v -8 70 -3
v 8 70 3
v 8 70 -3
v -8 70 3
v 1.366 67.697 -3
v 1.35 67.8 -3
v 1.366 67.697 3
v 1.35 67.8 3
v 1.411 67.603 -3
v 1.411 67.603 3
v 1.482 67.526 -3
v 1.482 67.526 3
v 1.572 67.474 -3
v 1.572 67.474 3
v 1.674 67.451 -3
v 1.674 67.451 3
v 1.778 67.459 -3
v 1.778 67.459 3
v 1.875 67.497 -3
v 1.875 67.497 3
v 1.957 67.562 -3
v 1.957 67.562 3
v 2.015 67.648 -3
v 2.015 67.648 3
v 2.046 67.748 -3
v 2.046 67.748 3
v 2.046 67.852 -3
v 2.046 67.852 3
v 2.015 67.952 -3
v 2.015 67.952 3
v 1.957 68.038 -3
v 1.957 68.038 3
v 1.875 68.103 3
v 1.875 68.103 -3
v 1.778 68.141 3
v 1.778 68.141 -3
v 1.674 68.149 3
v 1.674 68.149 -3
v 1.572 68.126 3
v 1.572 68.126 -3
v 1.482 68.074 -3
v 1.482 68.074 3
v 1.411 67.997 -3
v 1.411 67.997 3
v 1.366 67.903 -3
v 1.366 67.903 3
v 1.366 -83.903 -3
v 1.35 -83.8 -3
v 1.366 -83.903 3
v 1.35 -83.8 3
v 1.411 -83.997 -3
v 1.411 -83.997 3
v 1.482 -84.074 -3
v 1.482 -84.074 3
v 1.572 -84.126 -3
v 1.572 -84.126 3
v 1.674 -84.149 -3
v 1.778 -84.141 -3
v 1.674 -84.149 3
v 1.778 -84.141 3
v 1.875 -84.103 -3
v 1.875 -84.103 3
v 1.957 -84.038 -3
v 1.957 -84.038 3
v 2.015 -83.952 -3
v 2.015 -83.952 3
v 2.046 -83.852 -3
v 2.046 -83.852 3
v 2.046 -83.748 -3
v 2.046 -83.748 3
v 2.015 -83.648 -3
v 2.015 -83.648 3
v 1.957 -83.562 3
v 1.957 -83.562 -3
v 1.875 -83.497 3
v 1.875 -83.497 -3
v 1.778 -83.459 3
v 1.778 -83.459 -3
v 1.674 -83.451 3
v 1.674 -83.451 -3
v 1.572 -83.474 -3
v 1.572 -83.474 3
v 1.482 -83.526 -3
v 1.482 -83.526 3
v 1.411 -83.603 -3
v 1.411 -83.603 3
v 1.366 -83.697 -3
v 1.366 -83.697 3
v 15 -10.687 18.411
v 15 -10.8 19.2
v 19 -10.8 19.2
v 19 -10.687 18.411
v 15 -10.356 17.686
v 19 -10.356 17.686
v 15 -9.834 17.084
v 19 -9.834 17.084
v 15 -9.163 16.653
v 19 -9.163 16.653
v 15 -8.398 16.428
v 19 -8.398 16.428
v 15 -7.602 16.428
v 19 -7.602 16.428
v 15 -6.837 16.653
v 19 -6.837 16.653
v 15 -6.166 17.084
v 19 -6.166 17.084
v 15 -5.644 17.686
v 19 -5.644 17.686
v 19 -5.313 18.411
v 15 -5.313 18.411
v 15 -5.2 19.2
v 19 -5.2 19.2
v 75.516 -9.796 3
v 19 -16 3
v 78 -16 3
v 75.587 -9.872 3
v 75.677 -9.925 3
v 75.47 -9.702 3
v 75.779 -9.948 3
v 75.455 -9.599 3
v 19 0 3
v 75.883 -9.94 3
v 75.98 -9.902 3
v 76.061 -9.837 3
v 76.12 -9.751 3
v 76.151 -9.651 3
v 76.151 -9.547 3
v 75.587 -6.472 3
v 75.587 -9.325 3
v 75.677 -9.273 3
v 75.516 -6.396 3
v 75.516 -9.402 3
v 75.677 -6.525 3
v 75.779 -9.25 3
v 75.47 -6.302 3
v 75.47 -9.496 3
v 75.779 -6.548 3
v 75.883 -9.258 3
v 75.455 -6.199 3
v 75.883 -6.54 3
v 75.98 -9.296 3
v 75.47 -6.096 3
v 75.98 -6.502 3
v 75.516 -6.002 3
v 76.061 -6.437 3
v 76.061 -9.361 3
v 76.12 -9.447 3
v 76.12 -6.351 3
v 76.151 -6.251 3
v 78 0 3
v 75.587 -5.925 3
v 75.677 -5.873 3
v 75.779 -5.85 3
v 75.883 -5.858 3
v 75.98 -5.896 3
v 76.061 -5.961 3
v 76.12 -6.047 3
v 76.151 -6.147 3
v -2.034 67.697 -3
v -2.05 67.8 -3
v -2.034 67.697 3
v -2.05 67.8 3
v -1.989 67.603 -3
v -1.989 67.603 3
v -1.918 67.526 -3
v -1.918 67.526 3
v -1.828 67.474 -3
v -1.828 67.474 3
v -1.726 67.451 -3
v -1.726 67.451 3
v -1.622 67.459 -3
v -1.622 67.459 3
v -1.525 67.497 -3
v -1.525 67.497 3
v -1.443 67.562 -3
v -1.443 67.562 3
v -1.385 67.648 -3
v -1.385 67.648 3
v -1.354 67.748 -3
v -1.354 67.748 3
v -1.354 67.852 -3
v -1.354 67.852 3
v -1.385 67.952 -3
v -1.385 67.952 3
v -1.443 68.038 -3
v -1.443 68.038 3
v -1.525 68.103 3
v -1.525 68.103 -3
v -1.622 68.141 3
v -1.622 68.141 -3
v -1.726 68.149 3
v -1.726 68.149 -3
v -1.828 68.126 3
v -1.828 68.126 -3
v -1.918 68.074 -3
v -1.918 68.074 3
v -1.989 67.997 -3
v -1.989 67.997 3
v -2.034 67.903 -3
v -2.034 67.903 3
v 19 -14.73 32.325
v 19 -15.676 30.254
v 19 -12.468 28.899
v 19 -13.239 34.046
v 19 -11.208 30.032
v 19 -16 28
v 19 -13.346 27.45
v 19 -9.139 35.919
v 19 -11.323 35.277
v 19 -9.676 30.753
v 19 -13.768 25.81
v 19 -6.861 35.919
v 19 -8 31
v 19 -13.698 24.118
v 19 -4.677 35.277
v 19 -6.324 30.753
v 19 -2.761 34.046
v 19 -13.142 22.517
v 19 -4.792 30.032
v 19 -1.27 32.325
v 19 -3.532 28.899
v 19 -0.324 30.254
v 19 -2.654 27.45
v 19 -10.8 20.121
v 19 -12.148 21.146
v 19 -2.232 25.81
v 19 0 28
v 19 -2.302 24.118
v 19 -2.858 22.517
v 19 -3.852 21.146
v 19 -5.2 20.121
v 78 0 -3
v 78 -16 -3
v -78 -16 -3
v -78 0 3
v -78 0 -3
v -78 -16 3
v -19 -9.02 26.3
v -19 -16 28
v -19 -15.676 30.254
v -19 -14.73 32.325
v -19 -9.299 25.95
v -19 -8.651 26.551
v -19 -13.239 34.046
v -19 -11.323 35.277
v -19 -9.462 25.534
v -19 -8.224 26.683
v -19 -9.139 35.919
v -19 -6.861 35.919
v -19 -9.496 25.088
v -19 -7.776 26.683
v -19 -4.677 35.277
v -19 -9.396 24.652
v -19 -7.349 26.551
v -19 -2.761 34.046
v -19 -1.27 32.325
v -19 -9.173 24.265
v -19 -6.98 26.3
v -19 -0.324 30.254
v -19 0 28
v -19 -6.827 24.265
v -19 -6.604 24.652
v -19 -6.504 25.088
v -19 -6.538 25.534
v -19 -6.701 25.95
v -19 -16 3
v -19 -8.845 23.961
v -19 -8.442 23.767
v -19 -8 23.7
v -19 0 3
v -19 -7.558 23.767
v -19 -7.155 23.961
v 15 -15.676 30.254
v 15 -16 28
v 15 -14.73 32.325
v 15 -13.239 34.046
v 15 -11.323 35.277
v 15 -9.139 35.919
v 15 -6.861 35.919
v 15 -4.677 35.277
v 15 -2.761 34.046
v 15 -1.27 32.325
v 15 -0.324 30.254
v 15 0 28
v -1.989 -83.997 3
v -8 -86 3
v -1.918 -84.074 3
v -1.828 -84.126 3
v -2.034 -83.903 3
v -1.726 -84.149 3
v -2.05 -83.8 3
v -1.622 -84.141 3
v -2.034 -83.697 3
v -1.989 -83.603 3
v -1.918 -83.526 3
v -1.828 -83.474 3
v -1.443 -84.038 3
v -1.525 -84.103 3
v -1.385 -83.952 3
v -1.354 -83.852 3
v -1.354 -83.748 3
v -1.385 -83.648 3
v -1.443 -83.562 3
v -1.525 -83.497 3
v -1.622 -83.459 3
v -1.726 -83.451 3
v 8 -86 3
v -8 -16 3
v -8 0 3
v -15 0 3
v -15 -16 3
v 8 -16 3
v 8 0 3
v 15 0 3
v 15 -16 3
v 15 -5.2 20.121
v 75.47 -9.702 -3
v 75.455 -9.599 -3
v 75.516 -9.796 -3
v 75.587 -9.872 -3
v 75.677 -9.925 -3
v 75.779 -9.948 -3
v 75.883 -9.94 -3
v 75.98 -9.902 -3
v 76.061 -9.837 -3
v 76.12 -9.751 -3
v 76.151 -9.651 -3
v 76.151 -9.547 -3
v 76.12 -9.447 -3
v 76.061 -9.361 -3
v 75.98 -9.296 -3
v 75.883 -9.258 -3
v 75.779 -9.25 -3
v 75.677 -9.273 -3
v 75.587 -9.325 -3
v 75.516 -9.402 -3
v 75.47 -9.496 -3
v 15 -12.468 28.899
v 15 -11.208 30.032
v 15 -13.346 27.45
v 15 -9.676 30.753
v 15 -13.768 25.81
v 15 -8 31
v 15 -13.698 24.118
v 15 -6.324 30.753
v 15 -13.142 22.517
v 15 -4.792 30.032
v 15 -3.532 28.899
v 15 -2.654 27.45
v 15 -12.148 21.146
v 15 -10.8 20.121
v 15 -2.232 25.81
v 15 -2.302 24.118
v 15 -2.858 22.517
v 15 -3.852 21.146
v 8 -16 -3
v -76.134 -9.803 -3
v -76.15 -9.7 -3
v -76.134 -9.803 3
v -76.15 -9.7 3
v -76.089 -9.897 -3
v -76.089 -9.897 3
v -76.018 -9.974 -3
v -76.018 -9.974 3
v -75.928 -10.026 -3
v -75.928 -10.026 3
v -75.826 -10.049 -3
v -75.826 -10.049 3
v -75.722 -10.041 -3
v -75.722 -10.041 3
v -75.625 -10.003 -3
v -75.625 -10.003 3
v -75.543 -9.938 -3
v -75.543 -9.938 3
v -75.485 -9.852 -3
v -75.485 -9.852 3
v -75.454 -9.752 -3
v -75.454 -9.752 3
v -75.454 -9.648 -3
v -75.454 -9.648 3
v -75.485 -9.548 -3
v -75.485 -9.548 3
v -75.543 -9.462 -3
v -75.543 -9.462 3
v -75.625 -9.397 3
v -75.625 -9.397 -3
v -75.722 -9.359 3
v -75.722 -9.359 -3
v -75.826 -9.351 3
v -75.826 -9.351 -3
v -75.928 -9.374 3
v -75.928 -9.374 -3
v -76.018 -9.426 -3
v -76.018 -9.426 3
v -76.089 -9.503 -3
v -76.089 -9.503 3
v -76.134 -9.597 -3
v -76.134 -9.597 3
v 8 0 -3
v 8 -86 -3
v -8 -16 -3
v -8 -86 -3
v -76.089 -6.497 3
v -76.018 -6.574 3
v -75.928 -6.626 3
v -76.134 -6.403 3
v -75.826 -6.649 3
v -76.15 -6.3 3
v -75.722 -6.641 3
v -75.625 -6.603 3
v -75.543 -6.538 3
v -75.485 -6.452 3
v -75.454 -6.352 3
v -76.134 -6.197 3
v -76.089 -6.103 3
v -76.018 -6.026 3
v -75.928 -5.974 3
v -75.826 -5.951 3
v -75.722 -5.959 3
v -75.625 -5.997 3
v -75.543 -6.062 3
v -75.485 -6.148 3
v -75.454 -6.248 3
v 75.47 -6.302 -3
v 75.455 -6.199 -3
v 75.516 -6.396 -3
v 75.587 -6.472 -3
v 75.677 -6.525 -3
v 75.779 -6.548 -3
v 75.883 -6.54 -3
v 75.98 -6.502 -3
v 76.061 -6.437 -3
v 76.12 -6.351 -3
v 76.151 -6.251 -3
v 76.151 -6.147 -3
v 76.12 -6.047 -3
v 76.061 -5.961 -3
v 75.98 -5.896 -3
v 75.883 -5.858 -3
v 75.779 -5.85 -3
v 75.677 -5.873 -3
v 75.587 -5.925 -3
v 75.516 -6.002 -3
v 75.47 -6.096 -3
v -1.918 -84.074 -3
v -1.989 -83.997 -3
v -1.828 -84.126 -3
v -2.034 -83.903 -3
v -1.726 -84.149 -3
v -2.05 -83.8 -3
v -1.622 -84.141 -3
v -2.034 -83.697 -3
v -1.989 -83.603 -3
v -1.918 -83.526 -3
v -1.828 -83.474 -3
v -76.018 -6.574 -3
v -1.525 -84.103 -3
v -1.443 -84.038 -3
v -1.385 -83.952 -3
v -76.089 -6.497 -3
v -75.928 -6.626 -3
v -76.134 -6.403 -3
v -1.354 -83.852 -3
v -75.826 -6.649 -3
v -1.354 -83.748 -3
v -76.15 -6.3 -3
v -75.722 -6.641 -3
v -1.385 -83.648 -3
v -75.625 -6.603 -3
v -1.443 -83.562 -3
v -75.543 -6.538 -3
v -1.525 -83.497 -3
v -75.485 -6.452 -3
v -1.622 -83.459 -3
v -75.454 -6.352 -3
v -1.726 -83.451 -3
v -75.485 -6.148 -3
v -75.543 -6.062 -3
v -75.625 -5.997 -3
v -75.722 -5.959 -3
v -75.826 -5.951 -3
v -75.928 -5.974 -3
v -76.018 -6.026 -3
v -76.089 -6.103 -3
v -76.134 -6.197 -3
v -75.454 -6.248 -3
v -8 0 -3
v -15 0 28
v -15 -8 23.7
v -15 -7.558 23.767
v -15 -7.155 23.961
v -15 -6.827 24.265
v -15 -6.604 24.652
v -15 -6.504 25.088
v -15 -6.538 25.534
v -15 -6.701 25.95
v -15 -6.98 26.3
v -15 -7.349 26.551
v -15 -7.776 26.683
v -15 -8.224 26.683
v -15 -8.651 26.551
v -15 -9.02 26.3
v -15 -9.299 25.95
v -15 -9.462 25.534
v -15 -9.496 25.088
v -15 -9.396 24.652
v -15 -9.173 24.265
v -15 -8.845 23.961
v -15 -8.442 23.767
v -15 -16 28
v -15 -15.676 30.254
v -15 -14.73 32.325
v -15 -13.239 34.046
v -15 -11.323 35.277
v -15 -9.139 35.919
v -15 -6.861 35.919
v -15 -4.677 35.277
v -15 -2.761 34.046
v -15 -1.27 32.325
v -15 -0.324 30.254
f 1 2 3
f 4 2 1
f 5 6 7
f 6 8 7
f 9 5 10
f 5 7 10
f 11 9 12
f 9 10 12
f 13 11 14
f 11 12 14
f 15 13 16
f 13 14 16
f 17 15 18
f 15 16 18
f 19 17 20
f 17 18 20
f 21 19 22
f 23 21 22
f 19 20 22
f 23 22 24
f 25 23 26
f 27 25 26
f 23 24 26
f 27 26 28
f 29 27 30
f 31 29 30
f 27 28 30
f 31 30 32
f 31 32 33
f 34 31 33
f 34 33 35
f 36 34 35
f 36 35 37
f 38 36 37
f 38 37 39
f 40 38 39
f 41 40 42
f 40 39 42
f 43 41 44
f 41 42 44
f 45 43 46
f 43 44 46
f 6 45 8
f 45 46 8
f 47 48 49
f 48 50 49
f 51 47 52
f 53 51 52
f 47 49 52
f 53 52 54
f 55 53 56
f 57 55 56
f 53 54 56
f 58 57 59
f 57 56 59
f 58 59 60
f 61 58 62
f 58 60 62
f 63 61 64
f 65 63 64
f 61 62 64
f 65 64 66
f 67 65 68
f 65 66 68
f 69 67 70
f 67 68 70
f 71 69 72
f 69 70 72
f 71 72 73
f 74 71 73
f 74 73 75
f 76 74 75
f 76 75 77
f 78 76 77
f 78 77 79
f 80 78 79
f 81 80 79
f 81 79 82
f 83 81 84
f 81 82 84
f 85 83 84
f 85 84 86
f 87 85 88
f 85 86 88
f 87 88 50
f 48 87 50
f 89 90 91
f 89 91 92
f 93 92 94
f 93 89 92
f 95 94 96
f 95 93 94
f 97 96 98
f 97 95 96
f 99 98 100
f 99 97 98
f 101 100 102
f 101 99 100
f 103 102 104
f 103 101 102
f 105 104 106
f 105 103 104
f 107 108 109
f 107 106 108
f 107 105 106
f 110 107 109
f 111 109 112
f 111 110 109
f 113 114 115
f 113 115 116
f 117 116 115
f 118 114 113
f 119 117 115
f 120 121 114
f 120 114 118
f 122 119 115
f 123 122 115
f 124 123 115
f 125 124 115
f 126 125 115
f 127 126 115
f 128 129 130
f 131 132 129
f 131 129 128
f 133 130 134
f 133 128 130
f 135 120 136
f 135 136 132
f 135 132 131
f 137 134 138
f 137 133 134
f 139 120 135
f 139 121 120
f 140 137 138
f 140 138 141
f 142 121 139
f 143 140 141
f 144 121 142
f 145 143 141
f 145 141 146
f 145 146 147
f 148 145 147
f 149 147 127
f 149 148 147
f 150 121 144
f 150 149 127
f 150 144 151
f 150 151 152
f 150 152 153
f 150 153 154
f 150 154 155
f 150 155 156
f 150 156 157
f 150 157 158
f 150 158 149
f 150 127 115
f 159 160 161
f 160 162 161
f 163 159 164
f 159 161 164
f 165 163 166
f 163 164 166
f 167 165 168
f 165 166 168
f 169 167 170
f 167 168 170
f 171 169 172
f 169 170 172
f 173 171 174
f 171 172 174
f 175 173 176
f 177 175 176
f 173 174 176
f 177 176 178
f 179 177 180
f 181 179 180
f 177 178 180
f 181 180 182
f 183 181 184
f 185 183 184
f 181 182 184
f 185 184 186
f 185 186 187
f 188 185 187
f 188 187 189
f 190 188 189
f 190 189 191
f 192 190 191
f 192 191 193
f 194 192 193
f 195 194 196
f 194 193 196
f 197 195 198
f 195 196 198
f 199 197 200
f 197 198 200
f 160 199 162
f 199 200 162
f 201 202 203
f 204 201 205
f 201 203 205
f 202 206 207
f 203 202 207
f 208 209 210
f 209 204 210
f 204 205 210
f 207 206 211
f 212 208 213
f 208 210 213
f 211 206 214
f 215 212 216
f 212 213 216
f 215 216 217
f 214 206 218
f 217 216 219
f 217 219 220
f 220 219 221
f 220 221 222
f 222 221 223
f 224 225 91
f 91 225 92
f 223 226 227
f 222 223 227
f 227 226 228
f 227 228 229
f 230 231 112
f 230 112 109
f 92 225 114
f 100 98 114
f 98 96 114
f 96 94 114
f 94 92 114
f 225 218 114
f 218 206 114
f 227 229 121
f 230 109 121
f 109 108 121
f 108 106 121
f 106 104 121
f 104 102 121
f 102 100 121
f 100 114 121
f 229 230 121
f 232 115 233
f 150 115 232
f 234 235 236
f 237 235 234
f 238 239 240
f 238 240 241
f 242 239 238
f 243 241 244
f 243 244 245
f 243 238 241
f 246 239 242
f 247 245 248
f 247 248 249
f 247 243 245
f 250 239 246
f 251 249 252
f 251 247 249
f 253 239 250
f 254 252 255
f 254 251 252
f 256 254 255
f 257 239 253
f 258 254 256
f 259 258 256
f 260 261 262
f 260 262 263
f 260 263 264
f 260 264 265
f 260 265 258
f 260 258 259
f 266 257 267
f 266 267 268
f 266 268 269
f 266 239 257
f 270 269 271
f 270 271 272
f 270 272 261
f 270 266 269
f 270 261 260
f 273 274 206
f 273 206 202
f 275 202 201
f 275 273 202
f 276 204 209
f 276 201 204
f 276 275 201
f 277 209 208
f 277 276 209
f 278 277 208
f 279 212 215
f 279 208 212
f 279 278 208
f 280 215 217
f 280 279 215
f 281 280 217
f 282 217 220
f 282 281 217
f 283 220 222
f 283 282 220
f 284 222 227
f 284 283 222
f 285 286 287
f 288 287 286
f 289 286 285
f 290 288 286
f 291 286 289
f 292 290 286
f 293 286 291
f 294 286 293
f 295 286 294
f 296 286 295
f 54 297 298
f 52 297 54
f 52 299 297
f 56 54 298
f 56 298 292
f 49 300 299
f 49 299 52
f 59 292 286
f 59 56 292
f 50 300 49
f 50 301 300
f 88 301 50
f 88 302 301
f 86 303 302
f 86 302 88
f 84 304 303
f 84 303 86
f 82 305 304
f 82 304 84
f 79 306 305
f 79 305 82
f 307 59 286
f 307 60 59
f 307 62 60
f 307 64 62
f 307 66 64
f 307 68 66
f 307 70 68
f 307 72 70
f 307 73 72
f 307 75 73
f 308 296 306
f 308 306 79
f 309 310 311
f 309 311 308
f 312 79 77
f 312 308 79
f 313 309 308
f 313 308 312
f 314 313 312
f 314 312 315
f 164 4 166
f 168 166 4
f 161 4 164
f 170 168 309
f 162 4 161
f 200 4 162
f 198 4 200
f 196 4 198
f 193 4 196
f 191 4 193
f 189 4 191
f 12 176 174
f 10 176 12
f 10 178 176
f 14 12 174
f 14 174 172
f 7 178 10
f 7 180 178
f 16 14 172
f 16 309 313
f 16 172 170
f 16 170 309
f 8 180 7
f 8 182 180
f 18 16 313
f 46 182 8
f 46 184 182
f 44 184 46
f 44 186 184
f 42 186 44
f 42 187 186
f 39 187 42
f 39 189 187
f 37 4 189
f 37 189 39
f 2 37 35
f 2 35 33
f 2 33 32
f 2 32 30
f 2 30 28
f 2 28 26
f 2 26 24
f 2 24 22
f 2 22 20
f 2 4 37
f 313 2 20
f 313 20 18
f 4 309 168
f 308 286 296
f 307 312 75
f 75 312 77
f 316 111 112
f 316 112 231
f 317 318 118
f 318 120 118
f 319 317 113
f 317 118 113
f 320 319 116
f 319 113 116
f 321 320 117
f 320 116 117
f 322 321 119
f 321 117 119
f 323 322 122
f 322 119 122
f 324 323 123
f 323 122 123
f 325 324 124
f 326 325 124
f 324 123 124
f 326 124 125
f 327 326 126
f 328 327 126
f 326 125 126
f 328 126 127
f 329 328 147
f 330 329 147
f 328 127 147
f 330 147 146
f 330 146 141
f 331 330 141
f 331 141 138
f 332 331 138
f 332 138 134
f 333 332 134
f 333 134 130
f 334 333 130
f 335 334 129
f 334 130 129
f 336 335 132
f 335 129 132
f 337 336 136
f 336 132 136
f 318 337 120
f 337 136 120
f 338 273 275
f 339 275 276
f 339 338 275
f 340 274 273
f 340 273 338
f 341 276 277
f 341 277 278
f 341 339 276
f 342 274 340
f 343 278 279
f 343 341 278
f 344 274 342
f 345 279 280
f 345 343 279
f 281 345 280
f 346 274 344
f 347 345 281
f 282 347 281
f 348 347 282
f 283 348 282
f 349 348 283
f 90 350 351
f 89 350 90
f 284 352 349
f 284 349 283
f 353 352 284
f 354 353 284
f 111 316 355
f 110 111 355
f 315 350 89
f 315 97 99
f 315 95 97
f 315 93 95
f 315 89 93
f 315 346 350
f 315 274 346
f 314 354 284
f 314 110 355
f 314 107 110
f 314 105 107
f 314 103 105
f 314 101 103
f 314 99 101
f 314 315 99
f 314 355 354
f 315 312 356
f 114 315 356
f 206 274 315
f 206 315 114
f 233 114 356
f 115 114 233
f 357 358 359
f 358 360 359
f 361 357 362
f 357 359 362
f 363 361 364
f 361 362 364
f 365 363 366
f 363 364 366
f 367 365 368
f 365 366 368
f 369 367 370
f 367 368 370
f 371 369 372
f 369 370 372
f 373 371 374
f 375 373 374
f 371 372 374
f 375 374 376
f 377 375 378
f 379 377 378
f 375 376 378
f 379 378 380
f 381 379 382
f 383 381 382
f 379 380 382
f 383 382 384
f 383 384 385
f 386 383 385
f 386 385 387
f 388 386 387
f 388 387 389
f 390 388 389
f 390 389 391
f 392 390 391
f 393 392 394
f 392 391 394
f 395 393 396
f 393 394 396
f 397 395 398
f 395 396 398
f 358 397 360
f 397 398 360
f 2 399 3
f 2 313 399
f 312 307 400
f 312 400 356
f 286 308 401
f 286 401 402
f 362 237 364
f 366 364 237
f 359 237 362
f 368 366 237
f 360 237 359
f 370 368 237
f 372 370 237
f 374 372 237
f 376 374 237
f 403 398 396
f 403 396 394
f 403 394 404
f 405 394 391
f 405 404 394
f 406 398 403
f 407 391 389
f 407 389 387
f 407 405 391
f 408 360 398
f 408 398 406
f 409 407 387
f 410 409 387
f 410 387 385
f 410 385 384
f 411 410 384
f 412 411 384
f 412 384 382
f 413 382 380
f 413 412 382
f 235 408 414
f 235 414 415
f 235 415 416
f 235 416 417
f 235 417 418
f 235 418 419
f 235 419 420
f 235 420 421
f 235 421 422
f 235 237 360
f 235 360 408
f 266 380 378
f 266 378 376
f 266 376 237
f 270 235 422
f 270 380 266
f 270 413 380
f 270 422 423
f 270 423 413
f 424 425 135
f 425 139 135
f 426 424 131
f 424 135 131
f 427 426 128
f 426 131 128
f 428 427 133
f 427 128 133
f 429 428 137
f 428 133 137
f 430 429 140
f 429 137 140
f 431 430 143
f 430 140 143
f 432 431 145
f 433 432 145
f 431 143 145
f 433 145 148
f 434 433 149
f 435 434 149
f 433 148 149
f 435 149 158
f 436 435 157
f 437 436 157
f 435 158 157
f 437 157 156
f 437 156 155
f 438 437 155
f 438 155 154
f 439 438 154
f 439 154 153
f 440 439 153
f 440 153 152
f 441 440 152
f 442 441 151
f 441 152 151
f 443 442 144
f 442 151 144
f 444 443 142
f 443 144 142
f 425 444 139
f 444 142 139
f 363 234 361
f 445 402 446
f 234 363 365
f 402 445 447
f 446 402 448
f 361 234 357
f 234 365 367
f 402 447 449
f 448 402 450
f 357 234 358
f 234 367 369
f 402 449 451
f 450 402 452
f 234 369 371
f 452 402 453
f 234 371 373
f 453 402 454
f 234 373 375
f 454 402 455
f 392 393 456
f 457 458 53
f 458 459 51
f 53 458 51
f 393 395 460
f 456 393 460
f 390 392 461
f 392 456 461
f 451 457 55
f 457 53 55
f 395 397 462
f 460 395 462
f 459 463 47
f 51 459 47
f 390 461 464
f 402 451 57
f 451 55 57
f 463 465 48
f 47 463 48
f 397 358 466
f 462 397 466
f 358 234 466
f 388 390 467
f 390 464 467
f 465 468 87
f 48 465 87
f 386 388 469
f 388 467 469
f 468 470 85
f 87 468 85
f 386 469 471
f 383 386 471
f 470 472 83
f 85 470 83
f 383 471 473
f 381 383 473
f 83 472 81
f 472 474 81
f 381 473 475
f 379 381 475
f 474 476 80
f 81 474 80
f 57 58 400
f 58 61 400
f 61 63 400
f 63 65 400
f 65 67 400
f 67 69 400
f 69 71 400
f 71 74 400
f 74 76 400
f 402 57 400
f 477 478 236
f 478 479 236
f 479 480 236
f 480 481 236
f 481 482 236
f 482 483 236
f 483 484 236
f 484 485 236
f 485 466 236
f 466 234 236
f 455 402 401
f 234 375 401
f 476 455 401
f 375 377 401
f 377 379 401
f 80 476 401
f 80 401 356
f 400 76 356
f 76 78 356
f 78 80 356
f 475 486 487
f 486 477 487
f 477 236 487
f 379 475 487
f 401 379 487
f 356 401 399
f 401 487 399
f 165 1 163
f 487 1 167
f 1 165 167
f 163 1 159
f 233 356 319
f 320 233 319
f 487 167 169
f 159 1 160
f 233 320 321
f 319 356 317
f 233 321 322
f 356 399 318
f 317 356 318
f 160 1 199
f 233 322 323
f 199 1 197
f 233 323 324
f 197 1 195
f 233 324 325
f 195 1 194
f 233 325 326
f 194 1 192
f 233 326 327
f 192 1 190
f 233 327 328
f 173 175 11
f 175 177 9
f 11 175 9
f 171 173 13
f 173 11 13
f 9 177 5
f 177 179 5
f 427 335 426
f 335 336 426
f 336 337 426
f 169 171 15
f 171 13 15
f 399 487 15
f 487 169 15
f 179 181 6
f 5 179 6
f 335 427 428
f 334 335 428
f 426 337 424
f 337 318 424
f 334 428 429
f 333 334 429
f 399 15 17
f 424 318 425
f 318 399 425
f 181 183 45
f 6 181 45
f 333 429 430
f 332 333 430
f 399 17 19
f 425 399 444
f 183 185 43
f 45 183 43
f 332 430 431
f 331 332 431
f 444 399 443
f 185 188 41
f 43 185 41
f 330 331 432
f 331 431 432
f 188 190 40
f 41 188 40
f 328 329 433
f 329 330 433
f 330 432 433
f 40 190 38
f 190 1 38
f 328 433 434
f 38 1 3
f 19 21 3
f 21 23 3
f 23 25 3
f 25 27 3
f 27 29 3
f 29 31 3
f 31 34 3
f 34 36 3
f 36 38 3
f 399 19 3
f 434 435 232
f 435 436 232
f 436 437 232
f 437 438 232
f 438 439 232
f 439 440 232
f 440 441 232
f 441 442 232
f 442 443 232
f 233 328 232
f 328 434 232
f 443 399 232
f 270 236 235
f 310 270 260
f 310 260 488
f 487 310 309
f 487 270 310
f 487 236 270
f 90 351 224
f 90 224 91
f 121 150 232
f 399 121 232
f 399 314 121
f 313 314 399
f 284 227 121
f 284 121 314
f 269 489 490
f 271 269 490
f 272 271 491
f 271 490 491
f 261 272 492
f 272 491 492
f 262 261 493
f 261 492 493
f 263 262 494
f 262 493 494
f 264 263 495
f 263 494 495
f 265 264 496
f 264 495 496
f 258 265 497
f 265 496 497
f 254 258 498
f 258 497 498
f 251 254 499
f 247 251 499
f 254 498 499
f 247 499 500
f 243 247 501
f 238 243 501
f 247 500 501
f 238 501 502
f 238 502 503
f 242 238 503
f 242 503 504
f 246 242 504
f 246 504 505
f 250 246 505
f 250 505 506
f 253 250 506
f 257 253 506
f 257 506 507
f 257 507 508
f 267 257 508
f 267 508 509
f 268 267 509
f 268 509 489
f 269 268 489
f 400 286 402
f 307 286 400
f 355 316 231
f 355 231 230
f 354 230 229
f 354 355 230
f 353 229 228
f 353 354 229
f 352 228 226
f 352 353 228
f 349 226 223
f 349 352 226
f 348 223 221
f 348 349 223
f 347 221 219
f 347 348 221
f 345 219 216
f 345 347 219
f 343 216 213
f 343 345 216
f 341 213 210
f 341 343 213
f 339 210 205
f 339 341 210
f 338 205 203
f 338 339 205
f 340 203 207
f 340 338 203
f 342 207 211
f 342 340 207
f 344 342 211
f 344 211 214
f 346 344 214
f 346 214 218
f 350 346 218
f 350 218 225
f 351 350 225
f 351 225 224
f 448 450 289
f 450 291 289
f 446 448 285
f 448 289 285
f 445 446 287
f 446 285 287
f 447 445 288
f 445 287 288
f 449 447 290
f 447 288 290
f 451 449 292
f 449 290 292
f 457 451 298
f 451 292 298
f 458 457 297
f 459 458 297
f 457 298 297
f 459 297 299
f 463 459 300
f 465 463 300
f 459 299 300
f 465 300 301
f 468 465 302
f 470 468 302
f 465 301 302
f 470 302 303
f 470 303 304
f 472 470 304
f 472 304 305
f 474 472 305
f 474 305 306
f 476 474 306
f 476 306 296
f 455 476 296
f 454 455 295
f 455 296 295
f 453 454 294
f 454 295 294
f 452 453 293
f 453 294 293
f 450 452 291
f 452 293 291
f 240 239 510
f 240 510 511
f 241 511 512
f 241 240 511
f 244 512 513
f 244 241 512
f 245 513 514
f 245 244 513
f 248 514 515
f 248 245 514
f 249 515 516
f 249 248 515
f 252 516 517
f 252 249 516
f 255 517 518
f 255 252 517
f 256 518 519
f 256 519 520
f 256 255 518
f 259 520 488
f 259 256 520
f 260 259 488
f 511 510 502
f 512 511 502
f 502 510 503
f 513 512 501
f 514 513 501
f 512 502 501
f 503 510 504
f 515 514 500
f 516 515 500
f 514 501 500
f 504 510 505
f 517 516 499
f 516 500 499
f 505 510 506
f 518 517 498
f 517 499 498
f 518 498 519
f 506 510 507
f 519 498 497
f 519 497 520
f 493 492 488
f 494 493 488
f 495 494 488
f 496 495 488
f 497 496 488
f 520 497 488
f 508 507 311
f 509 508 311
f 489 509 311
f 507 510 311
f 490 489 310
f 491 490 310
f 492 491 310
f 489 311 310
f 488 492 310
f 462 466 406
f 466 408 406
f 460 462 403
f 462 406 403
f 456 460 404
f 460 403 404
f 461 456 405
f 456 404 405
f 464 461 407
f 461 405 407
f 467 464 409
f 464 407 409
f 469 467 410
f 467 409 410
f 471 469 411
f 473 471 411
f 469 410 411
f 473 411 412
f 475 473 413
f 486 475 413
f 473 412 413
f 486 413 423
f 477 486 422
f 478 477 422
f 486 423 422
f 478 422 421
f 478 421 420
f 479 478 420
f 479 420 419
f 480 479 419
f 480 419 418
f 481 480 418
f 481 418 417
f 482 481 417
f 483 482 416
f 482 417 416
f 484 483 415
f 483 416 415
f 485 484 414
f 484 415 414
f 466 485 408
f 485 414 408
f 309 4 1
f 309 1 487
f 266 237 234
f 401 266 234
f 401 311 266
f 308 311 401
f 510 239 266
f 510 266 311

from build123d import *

# Parameters (mm, degrees)
Y_KSEKLIK_EKSTR_ZYON1_DEPTH = 3
IZIM2_R                     = 0.35
KES_EKSTR_ZYON1_DEPTH       = 5
IZIM3_W                     = 4
IZIM3_H                     = 16
Y_KSEKLIK_EKSTR_ZYON4_DEPTH = 36
KES_EKSTR_ZYON2_DEPTH       = 122.556571192
KES_EKSTR_ZYON2_DEPTH_BACK  = 122.556571192
KES_EKSTR_ZYON3_DEPTH       = 100
IZIM8_R                     = 1.5
KES_EKSTR_ZYON4_DEPTH       = 30


with BuildPart() as part:
    # Çizim1 → Yükseklik-Ekstrüzyon1 (new, symmetric)
    with BuildSketch(Plane.XY):
        Polygon((8, 70), (-8, 70), (-8, 0), (-78, 0), (-78, -16), (-8, -16), (-8, -86), (8, -86), (8, -16), (78, -16), (78, 0), (8, 0), align=None)
    extrude(amount=Y_KSEKLIK_EKSTR_ZYON1_DEPTH, both=True)

    # Çizim2 → Kes-Ekstrüzyon1 (cut, symmetric)
    with BuildSketch(Plane.XY):
        with Locations(Location((-75.8, -6.3, 0), (0, 0, 180))):
            Circle(IZIM2_R)
        with Locations(Location((-75.8, -9.7, 0), (0, 0, 180))):
            Circle(IZIM2_R)
        with Locations(Location((-1.7, 67.8, 0), (0, 0, 180))):
            Circle(IZIM2_R)
        with Locations(Location((1.7, 67.8, 0), (0, 0, 180))):
            Circle(IZIM2_R)
        with Locations(Location((75.804898835, -6.19877905, 0), (0, 0, 180))):
            Circle(IZIM2_R)
        with Locations(Location((75.804898835, -9.59877905, 0), (0, 0, 180))):
            Circle(IZIM2_R)
        with Locations((-75.804898835, 141.79877905)):
            Circle(IZIM2_R)
        with Locations((-75.804898835, 145.19877905)):
            Circle(IZIM2_R)
        with Locations((73.99877905, 143.604898835)):
            Circle(IZIM2_R)
        with Locations((77.39877905, 143.604898835)):
            Circle(IZIM2_R)
        with Locations(Location((-1.7, -83.8, 0), (0, 0, 180))):
            Circle(IZIM2_R)
        with Locations(Location((1.7, -83.8, 0), (0, 0, 180))):
            Circle(IZIM2_R)
    extrude(amount=KES_EKSTR_ZYON1_DEPTH, both=True, mode=Mode.SUBTRACT)

    # Çizim3 → Yükseklik-Ekstrüzyon4 (add)
    with BuildSketch(Plane.XY):
        with Locations((-17, -8)):
            Rectangle(IZIM3_W, IZIM3_H)
        with Locations((17, -8)):
            Rectangle(IZIM3_W, IZIM3_H)
    extrude(amount=Y_KSEKLIK_EKSTR_ZYON4_DEPTH)

    # Çizim6 → Kes-Ekstrüzyon2 (cut, two sides: drawn at the far end of the back side and taken through both)
    with BuildSketch(Plane(origin=(0, 0, 0), x_dir=(0, 0, -1), z_dir=(1, 0, 0)).offset(-KES_EKSTR_ZYON2_DEPTH_BACK)):
        with BuildLine():
            Line((-36, 0), (-39.977521608, 0))
            Line((-39.977521608, 0), (-39.977521608, -16))
            Line((-39.977521608, -16), (-36, -16))
            Line((-36, -16), (-28, -16))
            ThreePointArc((-28, -16), (-36, -8), (-28, 0))
            Line((-28, 0), (-36, 0))
        make_face()
    extrude(amount=KES_EKSTR_ZYON2_DEPTH + KES_EKSTR_ZYON2_DEPTH_BACK, mode=Mode.SUBTRACT)

    # Çizim7 → Kes-Ekstrüzyon3 (cut)
    with BuildSketch(Plane(origin=(0, 0, 0), x_dir=(0, 0, -1), z_dir=(1, 0, 0))):
        with BuildLine():
            Line((-19.2, -5.2), (-20.12062996, -5.2))
            ThreePointArc((-20.12062996, -5.2), (-31, -8), (-20.12062996, -10.8))
            Line((-20.12062996, -10.8), (-19.2, -10.8))
            ThreePointArc((-19.2, -10.8), (-16.4, -8), (-19.2, -5.2))
        make_face()
    extrude(amount=KES_EKSTR_ZYON3_DEPTH, mode=Mode.SUBTRACT)

    # Çizim8 → Kes-Ekstrüzyon4 (cut)
    with BuildSketch(Plane(origin=(-9.5, 0, 0), x_dir=(0, 0, -1), z_dir=(1, 0, 0))):
        with Locations((-25.2, -8)):
            Circle(IZIM8_R)
    extrude(amount=-KES_EKSTR_ZYON4_DEPTH, mode=Mode.SUBTRACT)


solid = part.part
